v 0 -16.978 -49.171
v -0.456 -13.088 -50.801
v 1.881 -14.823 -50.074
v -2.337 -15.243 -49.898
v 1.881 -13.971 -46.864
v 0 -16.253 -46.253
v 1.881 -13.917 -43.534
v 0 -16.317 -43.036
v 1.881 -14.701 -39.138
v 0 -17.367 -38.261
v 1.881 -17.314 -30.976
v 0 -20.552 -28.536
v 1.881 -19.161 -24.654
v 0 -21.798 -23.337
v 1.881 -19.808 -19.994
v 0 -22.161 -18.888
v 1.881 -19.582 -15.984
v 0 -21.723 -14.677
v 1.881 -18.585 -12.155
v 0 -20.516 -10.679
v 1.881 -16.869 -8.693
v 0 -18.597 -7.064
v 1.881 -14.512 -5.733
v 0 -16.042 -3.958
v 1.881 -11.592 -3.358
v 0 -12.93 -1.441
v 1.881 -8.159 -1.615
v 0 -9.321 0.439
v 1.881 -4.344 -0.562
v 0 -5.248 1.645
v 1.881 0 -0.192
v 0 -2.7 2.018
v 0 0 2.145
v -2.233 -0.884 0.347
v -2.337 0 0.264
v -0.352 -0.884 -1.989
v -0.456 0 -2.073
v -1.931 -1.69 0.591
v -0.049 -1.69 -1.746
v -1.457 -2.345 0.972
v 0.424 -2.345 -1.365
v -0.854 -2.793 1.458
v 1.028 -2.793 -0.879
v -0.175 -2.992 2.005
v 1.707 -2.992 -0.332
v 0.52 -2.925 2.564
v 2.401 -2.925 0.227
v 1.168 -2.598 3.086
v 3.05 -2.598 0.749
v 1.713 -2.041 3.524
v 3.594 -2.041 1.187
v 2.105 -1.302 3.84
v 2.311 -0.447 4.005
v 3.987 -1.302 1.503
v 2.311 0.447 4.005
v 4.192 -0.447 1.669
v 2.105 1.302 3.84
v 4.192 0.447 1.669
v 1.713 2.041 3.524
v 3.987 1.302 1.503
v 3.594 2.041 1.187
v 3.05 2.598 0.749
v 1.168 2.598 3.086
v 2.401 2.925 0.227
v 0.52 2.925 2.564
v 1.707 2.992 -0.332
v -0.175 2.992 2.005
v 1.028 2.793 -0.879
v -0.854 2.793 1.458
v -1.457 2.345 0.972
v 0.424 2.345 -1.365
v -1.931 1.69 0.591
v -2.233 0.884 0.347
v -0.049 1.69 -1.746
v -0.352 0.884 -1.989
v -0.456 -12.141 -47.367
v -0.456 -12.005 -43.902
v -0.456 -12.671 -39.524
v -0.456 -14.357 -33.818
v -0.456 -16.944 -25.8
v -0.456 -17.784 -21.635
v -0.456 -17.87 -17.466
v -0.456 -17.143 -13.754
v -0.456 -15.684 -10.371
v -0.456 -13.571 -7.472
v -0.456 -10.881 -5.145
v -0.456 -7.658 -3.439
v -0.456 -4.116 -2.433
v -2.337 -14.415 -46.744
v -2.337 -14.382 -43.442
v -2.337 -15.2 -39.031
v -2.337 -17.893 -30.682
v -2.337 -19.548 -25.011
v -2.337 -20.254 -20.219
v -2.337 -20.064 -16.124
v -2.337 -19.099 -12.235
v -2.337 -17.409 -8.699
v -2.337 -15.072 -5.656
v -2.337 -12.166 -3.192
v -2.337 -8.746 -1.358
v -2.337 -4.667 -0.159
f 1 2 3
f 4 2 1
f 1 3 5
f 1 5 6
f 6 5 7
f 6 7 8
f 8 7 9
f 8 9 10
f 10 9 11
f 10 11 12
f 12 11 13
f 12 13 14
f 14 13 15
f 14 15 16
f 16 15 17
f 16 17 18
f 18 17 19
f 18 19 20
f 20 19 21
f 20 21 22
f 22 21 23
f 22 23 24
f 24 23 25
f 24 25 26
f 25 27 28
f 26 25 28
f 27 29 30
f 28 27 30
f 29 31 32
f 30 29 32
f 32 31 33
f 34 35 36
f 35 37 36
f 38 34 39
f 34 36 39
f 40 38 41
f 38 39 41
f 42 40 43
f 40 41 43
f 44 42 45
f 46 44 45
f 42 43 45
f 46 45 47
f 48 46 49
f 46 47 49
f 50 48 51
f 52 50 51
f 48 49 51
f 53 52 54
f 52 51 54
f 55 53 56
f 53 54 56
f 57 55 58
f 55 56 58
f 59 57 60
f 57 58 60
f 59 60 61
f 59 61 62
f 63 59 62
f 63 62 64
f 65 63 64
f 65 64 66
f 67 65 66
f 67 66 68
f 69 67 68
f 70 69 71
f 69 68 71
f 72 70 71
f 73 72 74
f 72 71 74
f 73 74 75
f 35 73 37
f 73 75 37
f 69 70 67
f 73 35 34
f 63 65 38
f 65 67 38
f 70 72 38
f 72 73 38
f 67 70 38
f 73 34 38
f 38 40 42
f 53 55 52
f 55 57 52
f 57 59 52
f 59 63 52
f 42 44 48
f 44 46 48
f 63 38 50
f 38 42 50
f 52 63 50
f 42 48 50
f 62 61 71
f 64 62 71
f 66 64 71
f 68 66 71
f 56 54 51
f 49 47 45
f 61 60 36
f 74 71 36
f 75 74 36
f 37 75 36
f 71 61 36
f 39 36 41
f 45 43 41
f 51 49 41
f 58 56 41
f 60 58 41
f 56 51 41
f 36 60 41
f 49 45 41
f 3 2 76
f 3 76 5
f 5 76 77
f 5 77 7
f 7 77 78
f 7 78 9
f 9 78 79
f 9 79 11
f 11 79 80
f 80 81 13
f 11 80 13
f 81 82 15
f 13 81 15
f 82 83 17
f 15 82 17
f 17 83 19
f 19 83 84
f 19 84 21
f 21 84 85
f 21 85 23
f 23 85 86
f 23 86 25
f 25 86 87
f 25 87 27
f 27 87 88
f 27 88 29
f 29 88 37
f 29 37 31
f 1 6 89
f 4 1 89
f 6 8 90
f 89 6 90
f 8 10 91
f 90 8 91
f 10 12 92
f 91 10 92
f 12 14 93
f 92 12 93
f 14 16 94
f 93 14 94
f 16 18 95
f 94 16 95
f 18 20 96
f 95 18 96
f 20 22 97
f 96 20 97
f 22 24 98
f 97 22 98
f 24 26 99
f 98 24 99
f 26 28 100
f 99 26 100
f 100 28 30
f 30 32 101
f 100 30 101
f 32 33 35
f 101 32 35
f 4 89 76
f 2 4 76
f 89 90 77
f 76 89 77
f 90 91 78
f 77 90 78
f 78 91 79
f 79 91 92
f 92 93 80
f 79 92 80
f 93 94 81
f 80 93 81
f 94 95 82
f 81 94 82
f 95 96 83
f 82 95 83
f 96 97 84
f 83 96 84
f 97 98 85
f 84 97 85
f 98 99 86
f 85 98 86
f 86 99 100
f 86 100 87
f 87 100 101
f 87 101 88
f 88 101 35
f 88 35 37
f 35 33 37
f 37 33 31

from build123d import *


with BuildPart() as f2:
    # F2: sweep along a path in F0
    with BuildLine(Plane.YZ) as f2_path:
        add(Plane.YZ * Edge.make_bspline(
            [(-15, -50), (-11.2899877131, -41.1478094757), (-27.5546960036, -20.1726213757), (-13.5293249041, 0), (0, 0)],
            knots=[0, 0, 0, 0, 0.5090728796, 1, 1, 1, 1], degree=3))
    # F1 (on Front) → F2 (sweep)
    with BuildSketch(Plane.XZ):
        Polygon((-2.3368271547, 0.263841604), (-0.4555406668, -2.0729855507), (1.8812864878, -0.1916990629), (0, 2.1451280918), align=None)
    sweep(path=f2_path.line)


with BuildPart() as f3:
    # F1 (on Front) → F3 (revolve)
    with BuildSketch(Plane.XZ):
        Polygon((-2.3368271547, 0.263841604), (-0.4555406668, -2.0729855507), (1.8812864878, -0.1916990629), (0, 2.1451280918), align=None)
    revolve(axis=Axis((0.9406432439, 0, 0.9767145145), (-0.6270954959, 0, 0.7789423849)))


solid = Compound([f2.part, f3.part])
